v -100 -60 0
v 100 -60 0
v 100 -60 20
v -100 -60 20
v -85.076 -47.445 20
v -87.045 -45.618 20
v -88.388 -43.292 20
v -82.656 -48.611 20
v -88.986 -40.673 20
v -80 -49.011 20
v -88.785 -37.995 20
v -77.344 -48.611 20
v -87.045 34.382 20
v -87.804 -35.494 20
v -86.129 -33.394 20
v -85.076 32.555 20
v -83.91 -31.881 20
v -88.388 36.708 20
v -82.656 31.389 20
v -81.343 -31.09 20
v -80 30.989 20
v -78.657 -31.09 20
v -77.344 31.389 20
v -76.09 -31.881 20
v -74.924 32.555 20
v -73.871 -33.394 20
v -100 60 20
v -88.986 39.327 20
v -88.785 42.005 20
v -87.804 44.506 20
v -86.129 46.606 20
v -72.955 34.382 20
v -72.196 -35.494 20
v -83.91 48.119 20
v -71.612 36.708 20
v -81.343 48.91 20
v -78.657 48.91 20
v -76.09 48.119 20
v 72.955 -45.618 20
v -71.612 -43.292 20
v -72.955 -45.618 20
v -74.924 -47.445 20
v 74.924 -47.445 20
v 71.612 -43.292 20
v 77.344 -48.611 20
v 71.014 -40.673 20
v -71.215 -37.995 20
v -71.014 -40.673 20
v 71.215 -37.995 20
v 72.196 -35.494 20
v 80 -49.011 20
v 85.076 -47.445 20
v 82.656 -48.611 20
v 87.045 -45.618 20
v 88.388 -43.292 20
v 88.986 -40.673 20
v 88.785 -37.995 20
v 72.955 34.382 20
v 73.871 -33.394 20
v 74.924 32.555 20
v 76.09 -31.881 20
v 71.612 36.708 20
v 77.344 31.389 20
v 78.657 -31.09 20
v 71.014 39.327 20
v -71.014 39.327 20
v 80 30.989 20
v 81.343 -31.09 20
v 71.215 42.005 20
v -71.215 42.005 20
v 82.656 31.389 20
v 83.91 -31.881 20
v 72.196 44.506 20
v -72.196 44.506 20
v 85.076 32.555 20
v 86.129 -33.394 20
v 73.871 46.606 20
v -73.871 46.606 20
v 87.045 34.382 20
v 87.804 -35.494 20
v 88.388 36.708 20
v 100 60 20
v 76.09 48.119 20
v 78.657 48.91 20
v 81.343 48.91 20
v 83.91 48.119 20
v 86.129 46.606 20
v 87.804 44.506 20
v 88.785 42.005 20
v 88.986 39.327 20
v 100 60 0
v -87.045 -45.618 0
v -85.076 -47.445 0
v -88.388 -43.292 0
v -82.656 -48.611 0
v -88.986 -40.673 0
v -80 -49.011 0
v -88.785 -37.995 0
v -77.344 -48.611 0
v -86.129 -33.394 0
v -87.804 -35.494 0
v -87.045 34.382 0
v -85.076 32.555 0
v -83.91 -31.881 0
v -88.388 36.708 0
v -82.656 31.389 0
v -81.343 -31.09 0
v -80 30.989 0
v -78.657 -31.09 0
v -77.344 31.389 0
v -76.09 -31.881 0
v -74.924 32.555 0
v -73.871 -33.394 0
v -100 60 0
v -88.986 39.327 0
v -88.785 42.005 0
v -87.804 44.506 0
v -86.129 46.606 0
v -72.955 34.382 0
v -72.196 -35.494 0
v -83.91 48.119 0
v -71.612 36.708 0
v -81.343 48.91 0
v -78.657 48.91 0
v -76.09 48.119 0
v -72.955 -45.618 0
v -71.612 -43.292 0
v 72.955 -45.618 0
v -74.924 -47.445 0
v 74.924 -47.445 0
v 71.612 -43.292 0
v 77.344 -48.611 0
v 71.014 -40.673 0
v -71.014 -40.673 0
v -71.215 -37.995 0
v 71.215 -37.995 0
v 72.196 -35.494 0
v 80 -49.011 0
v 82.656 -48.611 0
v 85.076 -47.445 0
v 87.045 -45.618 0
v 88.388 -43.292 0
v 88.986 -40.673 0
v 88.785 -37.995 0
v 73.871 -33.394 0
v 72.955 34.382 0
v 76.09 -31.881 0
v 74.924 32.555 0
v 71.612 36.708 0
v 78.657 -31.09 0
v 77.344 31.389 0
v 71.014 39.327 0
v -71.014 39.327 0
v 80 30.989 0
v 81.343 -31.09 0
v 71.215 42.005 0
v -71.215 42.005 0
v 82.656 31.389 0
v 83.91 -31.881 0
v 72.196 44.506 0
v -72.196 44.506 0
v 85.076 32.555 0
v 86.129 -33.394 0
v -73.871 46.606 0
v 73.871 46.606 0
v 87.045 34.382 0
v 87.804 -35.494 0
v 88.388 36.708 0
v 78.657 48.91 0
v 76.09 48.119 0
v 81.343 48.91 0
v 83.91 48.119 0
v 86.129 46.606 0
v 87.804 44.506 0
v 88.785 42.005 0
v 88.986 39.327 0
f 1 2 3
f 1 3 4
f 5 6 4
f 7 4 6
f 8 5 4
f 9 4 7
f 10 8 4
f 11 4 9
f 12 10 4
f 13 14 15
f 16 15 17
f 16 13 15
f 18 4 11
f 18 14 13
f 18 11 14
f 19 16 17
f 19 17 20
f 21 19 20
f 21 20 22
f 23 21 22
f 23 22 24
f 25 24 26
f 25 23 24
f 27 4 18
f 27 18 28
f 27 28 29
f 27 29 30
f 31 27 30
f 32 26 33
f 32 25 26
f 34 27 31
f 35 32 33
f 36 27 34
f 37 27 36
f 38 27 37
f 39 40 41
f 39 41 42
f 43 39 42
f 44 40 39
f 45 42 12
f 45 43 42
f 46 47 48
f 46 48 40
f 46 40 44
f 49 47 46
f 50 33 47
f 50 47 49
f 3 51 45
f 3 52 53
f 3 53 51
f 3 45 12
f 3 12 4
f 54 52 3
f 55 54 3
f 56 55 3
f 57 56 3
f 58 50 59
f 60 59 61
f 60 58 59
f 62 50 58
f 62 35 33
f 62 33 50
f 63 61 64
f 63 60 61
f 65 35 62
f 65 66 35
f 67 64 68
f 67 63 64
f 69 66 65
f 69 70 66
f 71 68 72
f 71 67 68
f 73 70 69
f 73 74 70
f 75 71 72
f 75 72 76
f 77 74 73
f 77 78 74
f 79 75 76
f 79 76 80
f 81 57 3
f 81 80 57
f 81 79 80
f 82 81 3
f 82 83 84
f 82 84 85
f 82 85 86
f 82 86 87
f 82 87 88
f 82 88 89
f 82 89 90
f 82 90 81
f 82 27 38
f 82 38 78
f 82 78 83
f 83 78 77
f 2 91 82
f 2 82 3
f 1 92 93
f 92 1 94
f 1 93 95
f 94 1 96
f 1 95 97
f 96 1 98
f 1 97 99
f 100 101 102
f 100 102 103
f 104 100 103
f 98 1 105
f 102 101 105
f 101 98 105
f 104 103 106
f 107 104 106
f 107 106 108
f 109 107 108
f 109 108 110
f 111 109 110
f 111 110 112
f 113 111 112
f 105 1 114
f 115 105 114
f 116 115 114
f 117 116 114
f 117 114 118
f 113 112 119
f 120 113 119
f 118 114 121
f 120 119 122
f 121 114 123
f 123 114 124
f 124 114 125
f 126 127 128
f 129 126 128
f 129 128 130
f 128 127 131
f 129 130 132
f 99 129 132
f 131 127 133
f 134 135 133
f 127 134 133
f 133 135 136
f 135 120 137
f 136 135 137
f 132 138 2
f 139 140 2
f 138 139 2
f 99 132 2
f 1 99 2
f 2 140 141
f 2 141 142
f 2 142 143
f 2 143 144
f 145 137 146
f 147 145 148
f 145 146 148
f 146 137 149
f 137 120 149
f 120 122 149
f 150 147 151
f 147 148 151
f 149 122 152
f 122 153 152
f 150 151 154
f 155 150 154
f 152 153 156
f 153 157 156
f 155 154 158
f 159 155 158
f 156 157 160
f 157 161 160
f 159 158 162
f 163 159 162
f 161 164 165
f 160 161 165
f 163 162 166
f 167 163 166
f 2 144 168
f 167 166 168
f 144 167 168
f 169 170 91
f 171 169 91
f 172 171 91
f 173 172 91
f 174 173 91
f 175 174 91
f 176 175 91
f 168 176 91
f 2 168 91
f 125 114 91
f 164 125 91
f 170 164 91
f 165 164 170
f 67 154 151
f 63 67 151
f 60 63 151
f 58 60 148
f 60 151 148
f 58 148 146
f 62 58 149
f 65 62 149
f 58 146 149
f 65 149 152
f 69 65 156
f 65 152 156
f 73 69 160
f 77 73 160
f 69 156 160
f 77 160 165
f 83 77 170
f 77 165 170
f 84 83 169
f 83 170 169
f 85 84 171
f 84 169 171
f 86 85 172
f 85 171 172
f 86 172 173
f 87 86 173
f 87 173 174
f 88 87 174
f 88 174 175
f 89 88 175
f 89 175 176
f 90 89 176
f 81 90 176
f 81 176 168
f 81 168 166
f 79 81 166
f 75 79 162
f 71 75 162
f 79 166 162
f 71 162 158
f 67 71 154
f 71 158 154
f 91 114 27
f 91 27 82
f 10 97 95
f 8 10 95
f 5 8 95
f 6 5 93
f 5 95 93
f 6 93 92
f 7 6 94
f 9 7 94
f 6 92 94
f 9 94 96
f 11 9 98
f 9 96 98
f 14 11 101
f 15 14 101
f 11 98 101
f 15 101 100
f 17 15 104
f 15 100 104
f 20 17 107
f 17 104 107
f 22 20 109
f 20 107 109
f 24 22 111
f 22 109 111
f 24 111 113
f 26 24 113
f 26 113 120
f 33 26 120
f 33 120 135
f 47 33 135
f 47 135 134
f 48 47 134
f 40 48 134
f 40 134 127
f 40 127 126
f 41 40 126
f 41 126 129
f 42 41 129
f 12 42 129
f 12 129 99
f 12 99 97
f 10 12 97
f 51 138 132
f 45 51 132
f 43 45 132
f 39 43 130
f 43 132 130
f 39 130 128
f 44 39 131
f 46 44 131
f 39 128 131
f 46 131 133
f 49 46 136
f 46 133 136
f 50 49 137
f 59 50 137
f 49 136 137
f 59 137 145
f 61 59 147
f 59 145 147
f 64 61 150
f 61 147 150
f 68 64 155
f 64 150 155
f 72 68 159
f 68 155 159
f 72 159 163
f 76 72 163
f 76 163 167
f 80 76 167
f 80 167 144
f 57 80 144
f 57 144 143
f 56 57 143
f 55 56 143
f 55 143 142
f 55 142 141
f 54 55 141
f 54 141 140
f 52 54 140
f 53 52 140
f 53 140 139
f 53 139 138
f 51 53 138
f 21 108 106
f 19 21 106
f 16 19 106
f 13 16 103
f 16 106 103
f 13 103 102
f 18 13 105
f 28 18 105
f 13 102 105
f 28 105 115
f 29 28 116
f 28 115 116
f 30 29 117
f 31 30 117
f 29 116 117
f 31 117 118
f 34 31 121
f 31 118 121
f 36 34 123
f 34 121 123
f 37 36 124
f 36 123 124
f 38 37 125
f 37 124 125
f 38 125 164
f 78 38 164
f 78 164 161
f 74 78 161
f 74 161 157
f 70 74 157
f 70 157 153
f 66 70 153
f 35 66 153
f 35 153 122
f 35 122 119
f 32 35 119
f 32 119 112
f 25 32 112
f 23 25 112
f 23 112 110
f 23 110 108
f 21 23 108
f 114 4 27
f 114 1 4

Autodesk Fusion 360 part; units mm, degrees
sketch "Sketch1" plane through (0, 0, 0) normal (0, 0, 1) x (1, 0, 0)
  line L0 (-100, 60) -> (100, 60)
  line L1 (100, 60) -> (100, -60)
  line L2 (100, -60) -> (-100, -60)
  line L3 (-100, -60) -> (-100, 60)
  line L4 (-100, 60) -> (100, -60) construction
  line L5 (100, 60) -> (-100, -60) construction
extrude "Extrude1" add sketch "Sketch1" along normal blind 20
sketch "Sketch2" plane through (0, 0, 20) normal (0, 0, 1) x (-1, 0, 0)
  line L0 (100, 60) -> (-100, 60)
  line L1 (-100, 60) -> (-100, -60)
  line L2 (-100, -60) -> (100, -60)
  line L3 (100, -60) -> (100, 60)
  line L4 (80, -40) -> (-80, -40)
  line L5 (-80, -40) -> (-80, 40)
  line L6 (-80, 40) -> (80, 40)
  line L7 (80, 40) -> (80, -40)
  line L8 (80, -40) -> (-80, 40) construction
  line L9 (-80, -40) -> (80, 40) construction
hole "Hole1" at (-80, 40, 20) at (-80, -40, 20) at (80, 40, 20) at (80, -40, 20) direction (0, 0, -1) diameter 18.022 depth 20 tip angle 118
